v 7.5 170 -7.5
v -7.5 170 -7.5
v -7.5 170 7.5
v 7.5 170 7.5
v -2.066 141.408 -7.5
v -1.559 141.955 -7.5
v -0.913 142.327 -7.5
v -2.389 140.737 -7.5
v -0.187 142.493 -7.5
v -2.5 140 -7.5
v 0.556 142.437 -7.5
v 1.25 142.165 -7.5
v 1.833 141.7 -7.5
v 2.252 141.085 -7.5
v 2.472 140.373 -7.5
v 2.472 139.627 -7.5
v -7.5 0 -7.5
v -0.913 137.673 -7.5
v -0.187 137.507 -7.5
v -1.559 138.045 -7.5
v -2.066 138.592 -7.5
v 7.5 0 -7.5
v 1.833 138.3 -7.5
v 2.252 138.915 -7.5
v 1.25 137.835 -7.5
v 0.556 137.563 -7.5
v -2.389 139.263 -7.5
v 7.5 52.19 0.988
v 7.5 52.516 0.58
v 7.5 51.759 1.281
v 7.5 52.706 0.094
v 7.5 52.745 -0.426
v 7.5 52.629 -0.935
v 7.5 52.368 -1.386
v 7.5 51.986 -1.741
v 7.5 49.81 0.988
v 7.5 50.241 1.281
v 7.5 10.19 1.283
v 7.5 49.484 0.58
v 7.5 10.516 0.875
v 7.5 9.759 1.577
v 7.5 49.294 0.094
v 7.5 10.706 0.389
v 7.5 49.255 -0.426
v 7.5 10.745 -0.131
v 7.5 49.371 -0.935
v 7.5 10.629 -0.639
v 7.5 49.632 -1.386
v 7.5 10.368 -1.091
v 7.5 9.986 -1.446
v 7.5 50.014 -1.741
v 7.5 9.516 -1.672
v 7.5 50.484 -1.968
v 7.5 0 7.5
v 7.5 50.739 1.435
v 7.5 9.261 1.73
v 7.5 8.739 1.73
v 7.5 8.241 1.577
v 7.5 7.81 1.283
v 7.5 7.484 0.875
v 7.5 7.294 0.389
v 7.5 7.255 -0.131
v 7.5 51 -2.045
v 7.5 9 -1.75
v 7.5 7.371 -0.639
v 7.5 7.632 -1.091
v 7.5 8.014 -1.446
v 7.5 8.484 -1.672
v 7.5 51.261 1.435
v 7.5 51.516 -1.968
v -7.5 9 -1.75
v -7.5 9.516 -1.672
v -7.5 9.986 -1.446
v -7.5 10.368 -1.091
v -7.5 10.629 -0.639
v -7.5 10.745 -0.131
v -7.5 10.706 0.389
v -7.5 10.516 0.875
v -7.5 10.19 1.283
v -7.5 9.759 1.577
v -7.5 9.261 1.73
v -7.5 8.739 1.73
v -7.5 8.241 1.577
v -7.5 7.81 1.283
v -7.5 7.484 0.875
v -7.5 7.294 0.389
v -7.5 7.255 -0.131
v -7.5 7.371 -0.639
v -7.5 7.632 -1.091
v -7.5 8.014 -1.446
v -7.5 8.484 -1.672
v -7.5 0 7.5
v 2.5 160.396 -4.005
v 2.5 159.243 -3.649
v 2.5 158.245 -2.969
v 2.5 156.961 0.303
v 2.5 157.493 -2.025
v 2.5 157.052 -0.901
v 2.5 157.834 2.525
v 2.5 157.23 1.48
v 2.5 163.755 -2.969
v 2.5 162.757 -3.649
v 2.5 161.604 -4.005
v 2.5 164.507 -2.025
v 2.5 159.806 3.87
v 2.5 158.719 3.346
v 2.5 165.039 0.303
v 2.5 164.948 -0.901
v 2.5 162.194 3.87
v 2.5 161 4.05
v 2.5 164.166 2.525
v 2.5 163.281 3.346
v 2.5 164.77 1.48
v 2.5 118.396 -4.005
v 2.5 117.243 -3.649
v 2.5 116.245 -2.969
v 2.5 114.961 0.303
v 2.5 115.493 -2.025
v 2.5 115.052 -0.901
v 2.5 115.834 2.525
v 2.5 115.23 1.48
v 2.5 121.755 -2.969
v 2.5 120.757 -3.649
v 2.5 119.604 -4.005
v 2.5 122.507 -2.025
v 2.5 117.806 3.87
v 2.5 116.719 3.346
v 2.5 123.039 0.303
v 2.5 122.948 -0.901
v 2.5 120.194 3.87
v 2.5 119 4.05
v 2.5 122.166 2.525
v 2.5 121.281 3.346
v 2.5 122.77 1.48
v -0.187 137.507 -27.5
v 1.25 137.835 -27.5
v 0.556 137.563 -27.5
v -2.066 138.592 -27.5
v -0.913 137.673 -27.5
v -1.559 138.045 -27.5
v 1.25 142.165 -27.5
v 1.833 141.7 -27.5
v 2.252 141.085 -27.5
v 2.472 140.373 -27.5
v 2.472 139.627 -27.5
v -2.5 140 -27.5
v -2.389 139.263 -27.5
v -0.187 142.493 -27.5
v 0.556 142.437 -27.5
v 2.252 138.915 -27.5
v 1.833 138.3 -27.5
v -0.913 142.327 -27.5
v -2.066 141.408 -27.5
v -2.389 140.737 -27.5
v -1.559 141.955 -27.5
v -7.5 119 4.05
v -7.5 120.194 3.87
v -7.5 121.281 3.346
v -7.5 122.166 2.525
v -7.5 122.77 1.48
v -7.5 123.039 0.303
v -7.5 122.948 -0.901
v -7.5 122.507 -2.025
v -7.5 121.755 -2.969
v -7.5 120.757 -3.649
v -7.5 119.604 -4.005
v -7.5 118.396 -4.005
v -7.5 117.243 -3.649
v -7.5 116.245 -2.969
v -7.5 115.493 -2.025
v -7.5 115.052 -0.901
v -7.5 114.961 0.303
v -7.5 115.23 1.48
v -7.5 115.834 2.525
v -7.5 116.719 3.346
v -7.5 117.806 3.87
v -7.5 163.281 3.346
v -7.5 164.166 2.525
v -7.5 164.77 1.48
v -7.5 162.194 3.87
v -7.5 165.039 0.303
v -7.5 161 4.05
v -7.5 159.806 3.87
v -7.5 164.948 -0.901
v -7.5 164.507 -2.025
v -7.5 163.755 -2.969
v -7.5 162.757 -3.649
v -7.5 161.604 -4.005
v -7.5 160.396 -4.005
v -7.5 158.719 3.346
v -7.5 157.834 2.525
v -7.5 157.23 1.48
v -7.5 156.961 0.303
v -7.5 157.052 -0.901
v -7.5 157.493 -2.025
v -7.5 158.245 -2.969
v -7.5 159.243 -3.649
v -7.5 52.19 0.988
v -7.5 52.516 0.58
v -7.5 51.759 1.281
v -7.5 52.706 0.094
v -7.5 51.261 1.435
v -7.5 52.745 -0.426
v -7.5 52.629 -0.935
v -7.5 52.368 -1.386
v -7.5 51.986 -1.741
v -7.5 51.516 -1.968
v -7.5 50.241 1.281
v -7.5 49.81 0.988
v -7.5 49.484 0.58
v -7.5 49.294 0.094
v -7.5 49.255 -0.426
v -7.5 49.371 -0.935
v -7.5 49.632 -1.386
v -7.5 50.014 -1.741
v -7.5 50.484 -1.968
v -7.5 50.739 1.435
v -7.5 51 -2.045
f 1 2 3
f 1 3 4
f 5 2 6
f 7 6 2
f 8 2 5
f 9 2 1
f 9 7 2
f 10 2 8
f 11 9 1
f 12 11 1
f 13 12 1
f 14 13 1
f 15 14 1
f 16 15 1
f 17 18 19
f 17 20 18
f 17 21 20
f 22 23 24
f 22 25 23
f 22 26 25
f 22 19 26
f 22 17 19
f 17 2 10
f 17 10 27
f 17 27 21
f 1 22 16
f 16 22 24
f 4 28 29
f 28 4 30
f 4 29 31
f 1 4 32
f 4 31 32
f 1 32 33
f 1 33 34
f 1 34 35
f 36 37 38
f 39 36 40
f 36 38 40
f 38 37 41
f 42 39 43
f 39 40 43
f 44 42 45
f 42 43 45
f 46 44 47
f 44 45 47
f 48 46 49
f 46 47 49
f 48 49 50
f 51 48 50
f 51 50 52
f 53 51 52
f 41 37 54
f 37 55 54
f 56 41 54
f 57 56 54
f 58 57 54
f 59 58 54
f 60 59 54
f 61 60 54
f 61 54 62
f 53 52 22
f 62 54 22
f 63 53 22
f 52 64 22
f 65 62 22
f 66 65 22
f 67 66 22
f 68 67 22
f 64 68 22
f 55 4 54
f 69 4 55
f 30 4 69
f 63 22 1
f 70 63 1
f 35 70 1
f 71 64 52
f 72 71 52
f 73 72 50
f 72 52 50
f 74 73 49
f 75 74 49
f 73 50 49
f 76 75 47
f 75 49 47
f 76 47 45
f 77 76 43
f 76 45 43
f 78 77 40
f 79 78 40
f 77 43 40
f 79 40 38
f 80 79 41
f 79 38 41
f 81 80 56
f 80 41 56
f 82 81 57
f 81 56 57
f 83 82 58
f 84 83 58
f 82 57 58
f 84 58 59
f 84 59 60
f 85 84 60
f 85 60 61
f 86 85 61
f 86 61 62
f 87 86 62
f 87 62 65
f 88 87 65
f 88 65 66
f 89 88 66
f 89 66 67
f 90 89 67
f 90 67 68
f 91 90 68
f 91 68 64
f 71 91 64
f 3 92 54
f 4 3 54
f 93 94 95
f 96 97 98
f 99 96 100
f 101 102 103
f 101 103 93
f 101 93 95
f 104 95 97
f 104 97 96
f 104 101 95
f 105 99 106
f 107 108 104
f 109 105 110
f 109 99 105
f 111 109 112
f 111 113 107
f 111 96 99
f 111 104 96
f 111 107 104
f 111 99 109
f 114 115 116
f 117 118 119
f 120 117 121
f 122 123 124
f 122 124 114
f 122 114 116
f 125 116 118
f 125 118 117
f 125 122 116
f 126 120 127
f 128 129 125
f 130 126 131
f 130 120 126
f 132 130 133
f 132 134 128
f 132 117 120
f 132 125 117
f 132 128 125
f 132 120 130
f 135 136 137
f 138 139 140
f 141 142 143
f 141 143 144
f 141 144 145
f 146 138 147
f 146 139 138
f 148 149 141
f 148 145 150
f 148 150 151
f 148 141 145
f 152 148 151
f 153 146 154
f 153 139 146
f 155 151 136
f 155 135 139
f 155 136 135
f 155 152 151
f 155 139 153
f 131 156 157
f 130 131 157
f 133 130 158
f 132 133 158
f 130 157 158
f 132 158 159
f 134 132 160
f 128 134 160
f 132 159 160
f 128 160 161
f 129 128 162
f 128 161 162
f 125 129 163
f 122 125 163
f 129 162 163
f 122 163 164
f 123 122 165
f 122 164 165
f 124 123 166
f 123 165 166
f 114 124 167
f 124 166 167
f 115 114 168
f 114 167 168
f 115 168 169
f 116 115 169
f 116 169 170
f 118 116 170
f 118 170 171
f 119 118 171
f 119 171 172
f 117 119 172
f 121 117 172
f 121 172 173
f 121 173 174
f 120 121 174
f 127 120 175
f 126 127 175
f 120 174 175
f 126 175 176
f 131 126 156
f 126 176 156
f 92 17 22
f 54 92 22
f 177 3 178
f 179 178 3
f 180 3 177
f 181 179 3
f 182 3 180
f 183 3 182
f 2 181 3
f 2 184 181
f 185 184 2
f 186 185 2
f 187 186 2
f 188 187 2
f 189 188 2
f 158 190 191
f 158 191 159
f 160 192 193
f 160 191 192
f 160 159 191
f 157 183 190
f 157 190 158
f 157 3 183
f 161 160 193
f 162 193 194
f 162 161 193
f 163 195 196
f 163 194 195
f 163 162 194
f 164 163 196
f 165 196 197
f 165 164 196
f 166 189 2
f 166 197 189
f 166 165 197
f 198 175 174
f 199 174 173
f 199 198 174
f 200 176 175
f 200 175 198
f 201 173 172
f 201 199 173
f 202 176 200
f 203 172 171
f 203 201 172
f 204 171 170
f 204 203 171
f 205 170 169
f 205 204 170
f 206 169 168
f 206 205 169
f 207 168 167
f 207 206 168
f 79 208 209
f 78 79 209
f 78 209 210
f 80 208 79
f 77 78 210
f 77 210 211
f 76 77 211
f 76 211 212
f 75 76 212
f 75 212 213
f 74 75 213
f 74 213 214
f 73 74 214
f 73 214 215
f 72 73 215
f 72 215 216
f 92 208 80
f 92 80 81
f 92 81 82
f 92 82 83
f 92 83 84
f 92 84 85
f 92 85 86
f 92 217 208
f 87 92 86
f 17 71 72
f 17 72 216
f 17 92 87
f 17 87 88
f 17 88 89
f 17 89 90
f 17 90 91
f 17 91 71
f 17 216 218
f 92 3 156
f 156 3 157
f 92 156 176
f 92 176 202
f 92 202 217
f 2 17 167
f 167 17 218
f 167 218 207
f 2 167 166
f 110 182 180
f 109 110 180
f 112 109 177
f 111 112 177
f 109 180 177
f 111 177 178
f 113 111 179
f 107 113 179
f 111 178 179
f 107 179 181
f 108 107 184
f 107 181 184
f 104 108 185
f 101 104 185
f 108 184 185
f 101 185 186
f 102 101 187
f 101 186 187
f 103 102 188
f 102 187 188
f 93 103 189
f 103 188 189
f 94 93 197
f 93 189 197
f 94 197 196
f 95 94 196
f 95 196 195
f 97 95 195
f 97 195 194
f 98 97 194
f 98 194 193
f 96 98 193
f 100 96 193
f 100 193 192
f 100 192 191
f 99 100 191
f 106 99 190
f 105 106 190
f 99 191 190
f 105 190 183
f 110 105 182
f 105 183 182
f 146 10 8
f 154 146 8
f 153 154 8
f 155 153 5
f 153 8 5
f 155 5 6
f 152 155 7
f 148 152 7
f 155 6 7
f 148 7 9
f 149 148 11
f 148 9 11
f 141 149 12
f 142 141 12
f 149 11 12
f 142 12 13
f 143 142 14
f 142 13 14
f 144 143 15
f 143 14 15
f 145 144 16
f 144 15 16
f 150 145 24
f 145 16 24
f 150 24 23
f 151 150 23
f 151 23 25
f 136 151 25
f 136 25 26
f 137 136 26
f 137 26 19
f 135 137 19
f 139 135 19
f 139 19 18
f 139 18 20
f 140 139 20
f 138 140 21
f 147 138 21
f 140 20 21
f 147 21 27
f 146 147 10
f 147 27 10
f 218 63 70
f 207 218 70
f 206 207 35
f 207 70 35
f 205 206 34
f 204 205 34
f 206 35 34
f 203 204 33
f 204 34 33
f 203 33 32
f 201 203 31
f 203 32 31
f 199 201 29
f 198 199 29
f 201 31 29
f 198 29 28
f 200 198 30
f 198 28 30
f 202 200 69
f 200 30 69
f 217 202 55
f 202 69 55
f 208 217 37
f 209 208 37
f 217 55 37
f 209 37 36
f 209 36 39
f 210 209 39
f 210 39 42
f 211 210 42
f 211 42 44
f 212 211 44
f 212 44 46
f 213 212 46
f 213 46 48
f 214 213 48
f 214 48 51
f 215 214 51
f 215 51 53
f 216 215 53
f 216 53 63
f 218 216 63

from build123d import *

# Parameters (mm, degrees)
SKETCH1_W           = 15
SKETCH1_H           = 15
BOSS_EXTRUDE1_DEPTH = 170
SKETCH2_R           = 1.75
CUT_EXTRUDE1_DEPTH  = 16
SKETCH3_R           = 4.05
CUT_EXTRUDE2_DEPTH  = 10
SKETCH5_R           = 2.5
BOSS_EXTRUDE3_DEPTH = 20


with BuildPart() as part:
    # Sketch1 → Boss-Extrude1 (new body)
    with BuildSketch(Plane(origin=(0, 0, 0), x_dir=(1, 0, 0), z_dir=(0, 1, 0))):
        Rectangle(SKETCH1_W, SKETCH1_H)
    extrude(amount=BOSS_EXTRUDE1_DEPTH)

    # Sketch2 → Cut-Extrude1 (cut, through all)
    with BuildSketch(Plane(origin=(7.5, 0, 0), x_dir=(0, 0, -1), z_dir=(1, 0, 0))):
        with Locations((0, 9)):
            Circle(SKETCH2_R)
        with Locations((0.295283966, 51)):
            Circle(SKETCH2_R)
    extrude(amount=-CUT_EXTRUDE1_DEPTH, mode=Mode.SUBTRACT)

    # Sketch3 → Cut-Extrude2 (cut)
    with BuildSketch(Plane.ZY.offset(7.5)):
        with Locations((0, 161)):
            Circle(SKETCH3_R)
        with Locations((0, 119)):
            Circle(SKETCH3_R)
    extrude(amount=-CUT_EXTRUDE2_DEPTH, mode=Mode.SUBTRACT)

    # Sketch5 → Boss-Extrude3 (add)
    with BuildSketch(Plane(origin=(0, 0, -7.5), x_dir=(-1, 0, 0), z_dir=(0, 0, -1))):
        with Locations((0, 140)):
            Circle(SKETCH5_R)
    extrude(amount=BOSS_EXTRUDE3_DEPTH)


solid = part.part
